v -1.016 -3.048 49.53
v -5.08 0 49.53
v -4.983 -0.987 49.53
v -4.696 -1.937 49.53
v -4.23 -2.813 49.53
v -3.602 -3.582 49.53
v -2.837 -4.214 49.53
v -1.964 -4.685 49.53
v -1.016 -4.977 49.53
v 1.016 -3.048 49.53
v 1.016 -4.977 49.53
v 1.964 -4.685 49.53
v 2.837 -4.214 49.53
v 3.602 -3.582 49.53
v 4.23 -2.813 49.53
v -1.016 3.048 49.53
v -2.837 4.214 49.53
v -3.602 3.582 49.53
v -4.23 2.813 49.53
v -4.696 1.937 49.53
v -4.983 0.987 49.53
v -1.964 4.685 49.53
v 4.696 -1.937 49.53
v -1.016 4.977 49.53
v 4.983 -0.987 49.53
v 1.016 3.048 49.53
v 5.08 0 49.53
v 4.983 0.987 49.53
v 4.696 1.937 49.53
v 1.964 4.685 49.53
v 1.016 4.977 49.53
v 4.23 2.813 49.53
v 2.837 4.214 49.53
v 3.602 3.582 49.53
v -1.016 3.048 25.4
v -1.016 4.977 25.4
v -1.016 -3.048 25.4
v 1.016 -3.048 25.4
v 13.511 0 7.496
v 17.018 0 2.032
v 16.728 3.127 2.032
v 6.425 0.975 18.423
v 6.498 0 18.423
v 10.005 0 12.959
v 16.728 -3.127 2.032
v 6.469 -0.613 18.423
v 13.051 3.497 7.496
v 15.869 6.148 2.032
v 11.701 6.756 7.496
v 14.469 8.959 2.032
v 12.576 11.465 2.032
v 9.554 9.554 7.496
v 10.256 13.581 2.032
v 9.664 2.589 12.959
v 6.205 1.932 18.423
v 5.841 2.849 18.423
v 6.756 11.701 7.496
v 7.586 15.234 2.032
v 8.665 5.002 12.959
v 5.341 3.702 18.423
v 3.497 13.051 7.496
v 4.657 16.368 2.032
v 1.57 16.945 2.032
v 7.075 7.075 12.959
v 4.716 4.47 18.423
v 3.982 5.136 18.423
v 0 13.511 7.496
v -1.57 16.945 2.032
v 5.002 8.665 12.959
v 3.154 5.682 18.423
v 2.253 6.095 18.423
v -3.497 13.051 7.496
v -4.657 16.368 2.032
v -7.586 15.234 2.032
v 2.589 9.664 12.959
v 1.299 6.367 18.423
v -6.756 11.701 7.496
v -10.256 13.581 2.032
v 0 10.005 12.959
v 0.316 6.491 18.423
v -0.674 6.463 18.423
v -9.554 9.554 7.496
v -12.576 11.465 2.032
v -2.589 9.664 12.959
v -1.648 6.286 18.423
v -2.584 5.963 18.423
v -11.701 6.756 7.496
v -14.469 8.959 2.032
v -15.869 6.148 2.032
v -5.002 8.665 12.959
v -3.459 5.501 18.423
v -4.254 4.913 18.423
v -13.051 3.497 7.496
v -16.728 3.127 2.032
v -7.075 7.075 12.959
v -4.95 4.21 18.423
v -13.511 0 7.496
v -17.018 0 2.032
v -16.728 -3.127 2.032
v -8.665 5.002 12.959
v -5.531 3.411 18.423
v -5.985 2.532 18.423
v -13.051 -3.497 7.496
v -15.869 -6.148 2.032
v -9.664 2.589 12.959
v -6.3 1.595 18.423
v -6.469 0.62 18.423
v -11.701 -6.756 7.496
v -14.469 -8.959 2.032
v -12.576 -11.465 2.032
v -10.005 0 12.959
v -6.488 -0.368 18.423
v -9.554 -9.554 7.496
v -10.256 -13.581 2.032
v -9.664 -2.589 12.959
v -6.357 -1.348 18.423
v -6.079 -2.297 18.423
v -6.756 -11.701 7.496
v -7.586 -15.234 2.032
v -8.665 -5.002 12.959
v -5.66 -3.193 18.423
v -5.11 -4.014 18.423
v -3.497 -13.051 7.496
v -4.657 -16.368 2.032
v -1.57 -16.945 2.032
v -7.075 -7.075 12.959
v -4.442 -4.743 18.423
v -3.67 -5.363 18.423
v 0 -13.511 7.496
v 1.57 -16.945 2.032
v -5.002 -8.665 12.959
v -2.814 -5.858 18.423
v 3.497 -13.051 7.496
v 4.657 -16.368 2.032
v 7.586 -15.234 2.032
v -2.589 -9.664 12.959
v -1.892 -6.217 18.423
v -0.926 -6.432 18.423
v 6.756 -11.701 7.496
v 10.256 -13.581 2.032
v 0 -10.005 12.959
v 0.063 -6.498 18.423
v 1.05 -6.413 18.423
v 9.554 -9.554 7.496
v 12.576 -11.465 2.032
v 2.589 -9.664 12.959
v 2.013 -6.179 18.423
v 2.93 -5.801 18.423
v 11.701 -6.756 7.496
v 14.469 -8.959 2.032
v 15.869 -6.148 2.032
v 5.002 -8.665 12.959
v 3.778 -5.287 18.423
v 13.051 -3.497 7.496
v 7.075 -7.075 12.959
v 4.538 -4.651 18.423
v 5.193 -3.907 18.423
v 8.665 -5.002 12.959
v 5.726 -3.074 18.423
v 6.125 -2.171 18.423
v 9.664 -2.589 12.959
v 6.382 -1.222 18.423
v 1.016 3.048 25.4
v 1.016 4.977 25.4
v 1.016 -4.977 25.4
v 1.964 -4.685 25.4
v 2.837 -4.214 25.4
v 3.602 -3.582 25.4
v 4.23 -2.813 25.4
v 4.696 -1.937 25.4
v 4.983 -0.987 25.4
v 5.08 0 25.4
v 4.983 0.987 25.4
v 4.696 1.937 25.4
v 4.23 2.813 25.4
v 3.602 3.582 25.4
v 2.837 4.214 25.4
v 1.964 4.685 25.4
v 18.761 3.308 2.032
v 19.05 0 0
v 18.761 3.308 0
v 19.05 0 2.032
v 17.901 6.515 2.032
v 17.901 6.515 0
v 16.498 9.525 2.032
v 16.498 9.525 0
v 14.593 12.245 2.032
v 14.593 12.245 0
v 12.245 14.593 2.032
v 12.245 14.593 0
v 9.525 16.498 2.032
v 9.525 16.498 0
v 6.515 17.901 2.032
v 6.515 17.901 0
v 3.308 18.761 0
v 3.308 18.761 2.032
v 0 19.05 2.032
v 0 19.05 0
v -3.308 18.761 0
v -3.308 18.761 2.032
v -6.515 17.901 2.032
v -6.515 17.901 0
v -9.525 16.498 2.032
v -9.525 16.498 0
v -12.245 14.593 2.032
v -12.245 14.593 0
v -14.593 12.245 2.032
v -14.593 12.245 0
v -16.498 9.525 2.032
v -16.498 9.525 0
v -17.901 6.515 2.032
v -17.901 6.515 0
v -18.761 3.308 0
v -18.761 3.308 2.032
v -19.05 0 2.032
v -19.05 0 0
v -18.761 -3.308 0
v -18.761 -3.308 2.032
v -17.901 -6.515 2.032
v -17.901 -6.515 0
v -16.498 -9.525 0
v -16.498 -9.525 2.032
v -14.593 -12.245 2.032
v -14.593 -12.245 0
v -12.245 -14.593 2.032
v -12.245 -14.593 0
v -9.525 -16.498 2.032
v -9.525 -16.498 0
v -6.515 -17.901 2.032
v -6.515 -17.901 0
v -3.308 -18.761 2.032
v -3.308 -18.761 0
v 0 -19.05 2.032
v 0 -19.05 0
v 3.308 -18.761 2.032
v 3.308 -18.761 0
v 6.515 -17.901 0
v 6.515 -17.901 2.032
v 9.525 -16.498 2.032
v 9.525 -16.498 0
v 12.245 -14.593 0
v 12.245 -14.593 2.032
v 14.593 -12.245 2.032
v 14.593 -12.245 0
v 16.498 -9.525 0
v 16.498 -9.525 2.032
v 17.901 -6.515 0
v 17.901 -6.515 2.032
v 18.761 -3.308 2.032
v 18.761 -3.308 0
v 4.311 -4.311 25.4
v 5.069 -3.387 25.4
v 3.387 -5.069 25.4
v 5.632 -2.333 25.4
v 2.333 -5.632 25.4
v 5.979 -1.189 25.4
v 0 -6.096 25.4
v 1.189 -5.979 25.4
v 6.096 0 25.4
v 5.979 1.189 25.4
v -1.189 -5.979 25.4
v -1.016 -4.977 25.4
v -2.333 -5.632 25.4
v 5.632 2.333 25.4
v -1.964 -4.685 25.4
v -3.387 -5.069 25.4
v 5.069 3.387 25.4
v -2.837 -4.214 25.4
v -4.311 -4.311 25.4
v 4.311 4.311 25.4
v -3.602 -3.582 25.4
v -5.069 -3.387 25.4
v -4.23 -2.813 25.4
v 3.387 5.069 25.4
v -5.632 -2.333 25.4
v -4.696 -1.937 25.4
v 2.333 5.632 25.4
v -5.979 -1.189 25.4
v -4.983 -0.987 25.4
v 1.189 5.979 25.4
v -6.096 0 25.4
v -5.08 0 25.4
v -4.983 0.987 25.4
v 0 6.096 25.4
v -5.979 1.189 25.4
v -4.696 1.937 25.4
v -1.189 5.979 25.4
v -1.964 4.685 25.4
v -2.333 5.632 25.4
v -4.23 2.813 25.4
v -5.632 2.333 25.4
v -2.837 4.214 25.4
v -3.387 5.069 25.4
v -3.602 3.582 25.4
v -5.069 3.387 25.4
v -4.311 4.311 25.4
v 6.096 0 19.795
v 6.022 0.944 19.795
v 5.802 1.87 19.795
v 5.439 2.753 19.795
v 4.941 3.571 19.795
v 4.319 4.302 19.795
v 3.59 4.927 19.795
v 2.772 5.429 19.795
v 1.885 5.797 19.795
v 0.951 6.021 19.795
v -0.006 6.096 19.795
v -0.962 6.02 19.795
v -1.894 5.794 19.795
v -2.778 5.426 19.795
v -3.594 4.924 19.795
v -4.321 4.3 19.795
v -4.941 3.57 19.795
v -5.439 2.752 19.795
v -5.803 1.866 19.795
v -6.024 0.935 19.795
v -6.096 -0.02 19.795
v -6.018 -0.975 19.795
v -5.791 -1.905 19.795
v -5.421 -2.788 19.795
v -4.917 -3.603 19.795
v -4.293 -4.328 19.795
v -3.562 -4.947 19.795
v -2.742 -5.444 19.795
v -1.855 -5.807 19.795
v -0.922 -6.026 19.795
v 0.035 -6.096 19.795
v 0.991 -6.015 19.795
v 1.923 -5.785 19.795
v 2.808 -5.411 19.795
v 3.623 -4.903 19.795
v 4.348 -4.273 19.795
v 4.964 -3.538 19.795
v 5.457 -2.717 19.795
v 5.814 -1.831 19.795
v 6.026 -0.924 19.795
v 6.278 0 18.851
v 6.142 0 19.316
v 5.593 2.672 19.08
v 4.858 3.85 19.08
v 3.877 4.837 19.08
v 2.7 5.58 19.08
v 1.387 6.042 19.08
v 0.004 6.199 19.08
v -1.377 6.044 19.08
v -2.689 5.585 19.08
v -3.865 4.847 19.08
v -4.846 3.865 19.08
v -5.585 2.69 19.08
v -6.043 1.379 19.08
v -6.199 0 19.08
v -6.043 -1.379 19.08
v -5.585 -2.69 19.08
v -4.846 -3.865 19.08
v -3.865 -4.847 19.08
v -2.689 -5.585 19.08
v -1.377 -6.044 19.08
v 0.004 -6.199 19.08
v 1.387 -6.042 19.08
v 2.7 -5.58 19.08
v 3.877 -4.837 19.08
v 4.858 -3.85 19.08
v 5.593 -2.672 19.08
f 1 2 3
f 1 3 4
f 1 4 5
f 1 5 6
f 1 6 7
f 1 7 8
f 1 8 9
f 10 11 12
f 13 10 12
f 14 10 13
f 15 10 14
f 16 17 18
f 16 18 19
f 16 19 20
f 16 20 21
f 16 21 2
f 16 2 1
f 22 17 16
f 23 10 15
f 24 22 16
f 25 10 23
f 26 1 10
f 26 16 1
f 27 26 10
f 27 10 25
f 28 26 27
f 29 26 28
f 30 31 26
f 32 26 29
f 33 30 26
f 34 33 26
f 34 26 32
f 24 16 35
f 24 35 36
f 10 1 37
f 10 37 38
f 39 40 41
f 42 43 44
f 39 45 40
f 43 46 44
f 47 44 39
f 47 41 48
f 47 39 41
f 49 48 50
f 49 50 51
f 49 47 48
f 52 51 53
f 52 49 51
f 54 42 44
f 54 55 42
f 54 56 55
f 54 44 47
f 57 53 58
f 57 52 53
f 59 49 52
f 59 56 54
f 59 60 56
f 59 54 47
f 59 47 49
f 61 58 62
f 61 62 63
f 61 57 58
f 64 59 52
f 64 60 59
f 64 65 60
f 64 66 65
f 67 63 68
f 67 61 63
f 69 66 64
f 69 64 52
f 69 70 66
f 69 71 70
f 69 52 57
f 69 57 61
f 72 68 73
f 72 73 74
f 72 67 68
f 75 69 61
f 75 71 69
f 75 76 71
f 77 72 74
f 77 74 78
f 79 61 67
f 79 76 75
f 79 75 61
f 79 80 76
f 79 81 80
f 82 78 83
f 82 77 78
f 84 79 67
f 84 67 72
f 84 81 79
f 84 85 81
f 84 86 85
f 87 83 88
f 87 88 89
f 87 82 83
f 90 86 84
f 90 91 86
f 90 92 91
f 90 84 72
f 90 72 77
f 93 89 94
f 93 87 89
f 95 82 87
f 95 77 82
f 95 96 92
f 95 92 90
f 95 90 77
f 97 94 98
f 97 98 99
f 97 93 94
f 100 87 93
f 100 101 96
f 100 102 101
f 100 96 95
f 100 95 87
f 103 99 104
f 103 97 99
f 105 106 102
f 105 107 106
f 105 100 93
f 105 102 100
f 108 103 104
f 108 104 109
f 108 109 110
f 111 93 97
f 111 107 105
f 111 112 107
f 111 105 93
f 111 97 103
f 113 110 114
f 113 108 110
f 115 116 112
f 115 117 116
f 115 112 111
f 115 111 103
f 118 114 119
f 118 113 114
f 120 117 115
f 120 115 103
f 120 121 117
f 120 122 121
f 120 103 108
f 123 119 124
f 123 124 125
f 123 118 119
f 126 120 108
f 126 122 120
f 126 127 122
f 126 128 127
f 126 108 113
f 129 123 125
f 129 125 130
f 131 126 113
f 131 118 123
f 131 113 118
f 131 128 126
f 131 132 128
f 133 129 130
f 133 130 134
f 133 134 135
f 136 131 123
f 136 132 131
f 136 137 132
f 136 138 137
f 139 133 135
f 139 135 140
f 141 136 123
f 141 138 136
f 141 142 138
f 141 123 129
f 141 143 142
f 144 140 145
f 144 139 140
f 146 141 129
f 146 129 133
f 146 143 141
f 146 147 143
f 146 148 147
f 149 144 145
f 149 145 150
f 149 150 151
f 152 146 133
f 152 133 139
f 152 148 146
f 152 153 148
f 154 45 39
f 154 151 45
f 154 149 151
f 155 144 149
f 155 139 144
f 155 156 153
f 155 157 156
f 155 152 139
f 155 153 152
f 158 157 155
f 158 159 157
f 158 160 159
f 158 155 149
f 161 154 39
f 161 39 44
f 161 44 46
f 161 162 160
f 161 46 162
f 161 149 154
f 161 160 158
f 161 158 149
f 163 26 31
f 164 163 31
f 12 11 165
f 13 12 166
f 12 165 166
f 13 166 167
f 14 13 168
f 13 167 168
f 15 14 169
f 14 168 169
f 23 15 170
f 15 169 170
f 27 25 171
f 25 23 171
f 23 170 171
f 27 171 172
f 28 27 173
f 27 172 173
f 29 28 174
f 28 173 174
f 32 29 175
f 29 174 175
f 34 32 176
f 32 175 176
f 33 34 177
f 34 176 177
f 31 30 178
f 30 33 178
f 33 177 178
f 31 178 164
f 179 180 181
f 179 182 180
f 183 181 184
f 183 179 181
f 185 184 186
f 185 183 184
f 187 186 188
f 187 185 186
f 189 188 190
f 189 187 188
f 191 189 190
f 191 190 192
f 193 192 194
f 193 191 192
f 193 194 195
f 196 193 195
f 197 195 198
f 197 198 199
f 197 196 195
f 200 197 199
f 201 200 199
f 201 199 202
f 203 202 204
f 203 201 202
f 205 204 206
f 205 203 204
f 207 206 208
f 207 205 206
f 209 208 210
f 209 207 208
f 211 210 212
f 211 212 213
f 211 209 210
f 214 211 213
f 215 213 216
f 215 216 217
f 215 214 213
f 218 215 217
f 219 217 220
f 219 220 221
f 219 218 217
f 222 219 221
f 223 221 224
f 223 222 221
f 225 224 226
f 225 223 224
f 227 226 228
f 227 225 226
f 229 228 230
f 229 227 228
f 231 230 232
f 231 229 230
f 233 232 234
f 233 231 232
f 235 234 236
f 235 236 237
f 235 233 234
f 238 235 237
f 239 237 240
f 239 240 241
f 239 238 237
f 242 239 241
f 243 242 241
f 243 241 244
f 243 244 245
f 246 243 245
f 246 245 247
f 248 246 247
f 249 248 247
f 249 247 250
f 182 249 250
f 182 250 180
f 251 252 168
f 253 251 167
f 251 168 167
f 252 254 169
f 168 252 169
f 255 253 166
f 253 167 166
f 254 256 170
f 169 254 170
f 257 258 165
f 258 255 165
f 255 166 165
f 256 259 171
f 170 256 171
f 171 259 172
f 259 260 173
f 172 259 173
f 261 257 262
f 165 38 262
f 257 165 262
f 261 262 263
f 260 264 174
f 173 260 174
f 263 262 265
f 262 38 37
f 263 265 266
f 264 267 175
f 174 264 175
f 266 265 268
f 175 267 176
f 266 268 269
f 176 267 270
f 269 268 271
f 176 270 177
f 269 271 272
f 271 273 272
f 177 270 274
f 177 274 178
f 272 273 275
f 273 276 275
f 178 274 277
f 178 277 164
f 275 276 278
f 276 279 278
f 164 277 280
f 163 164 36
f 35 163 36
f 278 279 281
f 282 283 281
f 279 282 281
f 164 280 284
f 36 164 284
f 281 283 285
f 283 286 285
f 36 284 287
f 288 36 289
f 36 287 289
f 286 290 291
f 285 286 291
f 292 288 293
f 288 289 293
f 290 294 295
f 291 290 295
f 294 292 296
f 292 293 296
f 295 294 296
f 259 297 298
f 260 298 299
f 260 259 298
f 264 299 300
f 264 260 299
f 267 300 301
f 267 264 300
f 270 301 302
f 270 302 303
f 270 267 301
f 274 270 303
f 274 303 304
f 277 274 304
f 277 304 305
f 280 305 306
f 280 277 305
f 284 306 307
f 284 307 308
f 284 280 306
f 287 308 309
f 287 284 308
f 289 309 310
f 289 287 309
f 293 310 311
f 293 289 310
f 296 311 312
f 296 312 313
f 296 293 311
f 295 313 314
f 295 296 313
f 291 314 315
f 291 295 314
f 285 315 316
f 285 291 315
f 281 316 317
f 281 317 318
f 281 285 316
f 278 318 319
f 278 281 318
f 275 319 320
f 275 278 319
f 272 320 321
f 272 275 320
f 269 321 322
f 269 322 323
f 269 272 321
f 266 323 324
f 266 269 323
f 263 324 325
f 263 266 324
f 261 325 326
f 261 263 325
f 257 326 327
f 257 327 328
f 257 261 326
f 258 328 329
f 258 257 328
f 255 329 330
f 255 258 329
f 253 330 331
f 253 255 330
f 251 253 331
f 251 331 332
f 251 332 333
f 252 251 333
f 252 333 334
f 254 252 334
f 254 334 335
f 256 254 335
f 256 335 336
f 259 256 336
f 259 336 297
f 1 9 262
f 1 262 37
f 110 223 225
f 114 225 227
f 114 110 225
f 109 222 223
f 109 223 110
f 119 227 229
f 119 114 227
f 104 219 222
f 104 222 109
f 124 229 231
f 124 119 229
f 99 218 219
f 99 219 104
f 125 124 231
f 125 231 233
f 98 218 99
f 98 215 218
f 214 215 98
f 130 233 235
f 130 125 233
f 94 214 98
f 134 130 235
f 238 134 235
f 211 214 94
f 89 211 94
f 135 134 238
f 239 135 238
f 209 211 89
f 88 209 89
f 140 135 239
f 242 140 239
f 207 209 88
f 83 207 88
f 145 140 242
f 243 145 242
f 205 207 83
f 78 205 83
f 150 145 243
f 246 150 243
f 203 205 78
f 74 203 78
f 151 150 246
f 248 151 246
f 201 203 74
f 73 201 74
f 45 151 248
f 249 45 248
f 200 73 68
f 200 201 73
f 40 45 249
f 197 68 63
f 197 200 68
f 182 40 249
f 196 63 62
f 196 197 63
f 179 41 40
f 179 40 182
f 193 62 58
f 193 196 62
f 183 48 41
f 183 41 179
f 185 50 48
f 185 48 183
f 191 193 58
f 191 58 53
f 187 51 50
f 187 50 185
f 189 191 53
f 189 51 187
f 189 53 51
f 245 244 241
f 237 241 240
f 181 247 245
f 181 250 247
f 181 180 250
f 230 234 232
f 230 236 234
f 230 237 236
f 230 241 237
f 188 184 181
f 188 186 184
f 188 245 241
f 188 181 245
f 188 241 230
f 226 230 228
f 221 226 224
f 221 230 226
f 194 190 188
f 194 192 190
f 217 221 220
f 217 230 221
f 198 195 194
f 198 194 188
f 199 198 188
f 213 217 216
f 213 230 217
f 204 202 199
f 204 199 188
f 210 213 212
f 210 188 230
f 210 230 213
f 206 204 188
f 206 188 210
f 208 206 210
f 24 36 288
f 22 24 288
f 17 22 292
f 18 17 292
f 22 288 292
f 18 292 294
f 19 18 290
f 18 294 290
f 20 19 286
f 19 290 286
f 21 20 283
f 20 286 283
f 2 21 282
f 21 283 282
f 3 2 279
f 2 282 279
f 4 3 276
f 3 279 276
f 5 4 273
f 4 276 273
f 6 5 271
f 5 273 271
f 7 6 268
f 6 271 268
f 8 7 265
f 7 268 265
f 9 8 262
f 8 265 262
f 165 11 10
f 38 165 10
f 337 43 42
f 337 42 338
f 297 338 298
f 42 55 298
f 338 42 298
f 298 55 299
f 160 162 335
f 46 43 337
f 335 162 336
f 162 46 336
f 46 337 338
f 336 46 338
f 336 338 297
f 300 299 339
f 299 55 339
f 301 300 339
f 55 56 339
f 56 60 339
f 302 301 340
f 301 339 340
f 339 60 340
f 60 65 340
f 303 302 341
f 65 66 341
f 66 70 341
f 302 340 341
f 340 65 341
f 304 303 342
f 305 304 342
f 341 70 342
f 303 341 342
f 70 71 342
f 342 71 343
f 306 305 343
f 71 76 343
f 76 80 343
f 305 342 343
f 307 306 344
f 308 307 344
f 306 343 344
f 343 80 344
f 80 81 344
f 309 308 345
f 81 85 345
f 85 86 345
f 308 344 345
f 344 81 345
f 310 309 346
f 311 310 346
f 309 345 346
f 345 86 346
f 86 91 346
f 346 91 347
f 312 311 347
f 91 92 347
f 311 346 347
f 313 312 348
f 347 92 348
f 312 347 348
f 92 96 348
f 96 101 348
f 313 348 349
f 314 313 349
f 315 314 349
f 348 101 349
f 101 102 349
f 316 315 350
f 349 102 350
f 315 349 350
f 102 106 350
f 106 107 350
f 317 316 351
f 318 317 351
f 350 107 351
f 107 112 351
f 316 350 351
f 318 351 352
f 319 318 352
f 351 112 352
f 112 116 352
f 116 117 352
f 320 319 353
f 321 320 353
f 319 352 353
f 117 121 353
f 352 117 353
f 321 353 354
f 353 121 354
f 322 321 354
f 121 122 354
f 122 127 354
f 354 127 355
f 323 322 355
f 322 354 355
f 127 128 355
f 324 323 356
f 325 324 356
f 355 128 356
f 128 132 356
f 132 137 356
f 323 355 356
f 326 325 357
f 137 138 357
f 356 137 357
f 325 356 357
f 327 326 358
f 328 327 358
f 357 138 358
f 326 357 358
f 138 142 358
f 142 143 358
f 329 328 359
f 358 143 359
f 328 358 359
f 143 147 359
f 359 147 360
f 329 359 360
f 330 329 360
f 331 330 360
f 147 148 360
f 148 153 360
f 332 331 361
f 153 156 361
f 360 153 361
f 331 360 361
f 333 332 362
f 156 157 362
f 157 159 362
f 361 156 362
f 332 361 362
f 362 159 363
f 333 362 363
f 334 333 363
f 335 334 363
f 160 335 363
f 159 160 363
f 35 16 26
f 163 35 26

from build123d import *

# Parameters (mm, degrees)
F0_W     = 6.096
F0_H     = 6.35
F2_R     = 5.08
F3_DEPTH = 24.13
F4_R     = 2.54
F5_W     = 2.032
F5_H     = 2.54
F6_DEPTH = 24.13


with BuildPart() as f1:
    # F0 (on Front) → F1 (revolve)
    with BuildSketch(Plane.XZ):
        Polygon((0, 19.05), (0, 0), (19.05, 0), (19.05, 2.032), (17.018, 2.032), (6.096, 19.05), align=None)
        with Locations((3.048, 22.225)):
            Rectangle(F0_W, F0_H)
    revolve(axis=Axis((0, 0, 9.525), (0, 0, 1)))

    # F2 (on face) → F3 (join)
    with BuildSketch(Plane.XY.offset(25.4)):
        Circle(F2_R)
    extrude(amount=F3_DEPTH)

    # F4
    f4_edges = [f1.edges().sort_by_distance(p)[0] for p in [
        (-6.096, 0, 19.05),
    ]]
    fillet(f4_edges, radius=F4_R)

    # F5 (on face) → F6 (cut)
    with BuildSketch(Plane.XY.offset(49.53)):
        with Locations((0, 4.318)):
            Rectangle(F5_W, F5_H)
        with Locations((0, -4.318)):
            Rectangle(F5_W, F5_H)
    extrude(amount=-F6_DEPTH, mode=Mode.SUBTRACT)


solid = f1.part
